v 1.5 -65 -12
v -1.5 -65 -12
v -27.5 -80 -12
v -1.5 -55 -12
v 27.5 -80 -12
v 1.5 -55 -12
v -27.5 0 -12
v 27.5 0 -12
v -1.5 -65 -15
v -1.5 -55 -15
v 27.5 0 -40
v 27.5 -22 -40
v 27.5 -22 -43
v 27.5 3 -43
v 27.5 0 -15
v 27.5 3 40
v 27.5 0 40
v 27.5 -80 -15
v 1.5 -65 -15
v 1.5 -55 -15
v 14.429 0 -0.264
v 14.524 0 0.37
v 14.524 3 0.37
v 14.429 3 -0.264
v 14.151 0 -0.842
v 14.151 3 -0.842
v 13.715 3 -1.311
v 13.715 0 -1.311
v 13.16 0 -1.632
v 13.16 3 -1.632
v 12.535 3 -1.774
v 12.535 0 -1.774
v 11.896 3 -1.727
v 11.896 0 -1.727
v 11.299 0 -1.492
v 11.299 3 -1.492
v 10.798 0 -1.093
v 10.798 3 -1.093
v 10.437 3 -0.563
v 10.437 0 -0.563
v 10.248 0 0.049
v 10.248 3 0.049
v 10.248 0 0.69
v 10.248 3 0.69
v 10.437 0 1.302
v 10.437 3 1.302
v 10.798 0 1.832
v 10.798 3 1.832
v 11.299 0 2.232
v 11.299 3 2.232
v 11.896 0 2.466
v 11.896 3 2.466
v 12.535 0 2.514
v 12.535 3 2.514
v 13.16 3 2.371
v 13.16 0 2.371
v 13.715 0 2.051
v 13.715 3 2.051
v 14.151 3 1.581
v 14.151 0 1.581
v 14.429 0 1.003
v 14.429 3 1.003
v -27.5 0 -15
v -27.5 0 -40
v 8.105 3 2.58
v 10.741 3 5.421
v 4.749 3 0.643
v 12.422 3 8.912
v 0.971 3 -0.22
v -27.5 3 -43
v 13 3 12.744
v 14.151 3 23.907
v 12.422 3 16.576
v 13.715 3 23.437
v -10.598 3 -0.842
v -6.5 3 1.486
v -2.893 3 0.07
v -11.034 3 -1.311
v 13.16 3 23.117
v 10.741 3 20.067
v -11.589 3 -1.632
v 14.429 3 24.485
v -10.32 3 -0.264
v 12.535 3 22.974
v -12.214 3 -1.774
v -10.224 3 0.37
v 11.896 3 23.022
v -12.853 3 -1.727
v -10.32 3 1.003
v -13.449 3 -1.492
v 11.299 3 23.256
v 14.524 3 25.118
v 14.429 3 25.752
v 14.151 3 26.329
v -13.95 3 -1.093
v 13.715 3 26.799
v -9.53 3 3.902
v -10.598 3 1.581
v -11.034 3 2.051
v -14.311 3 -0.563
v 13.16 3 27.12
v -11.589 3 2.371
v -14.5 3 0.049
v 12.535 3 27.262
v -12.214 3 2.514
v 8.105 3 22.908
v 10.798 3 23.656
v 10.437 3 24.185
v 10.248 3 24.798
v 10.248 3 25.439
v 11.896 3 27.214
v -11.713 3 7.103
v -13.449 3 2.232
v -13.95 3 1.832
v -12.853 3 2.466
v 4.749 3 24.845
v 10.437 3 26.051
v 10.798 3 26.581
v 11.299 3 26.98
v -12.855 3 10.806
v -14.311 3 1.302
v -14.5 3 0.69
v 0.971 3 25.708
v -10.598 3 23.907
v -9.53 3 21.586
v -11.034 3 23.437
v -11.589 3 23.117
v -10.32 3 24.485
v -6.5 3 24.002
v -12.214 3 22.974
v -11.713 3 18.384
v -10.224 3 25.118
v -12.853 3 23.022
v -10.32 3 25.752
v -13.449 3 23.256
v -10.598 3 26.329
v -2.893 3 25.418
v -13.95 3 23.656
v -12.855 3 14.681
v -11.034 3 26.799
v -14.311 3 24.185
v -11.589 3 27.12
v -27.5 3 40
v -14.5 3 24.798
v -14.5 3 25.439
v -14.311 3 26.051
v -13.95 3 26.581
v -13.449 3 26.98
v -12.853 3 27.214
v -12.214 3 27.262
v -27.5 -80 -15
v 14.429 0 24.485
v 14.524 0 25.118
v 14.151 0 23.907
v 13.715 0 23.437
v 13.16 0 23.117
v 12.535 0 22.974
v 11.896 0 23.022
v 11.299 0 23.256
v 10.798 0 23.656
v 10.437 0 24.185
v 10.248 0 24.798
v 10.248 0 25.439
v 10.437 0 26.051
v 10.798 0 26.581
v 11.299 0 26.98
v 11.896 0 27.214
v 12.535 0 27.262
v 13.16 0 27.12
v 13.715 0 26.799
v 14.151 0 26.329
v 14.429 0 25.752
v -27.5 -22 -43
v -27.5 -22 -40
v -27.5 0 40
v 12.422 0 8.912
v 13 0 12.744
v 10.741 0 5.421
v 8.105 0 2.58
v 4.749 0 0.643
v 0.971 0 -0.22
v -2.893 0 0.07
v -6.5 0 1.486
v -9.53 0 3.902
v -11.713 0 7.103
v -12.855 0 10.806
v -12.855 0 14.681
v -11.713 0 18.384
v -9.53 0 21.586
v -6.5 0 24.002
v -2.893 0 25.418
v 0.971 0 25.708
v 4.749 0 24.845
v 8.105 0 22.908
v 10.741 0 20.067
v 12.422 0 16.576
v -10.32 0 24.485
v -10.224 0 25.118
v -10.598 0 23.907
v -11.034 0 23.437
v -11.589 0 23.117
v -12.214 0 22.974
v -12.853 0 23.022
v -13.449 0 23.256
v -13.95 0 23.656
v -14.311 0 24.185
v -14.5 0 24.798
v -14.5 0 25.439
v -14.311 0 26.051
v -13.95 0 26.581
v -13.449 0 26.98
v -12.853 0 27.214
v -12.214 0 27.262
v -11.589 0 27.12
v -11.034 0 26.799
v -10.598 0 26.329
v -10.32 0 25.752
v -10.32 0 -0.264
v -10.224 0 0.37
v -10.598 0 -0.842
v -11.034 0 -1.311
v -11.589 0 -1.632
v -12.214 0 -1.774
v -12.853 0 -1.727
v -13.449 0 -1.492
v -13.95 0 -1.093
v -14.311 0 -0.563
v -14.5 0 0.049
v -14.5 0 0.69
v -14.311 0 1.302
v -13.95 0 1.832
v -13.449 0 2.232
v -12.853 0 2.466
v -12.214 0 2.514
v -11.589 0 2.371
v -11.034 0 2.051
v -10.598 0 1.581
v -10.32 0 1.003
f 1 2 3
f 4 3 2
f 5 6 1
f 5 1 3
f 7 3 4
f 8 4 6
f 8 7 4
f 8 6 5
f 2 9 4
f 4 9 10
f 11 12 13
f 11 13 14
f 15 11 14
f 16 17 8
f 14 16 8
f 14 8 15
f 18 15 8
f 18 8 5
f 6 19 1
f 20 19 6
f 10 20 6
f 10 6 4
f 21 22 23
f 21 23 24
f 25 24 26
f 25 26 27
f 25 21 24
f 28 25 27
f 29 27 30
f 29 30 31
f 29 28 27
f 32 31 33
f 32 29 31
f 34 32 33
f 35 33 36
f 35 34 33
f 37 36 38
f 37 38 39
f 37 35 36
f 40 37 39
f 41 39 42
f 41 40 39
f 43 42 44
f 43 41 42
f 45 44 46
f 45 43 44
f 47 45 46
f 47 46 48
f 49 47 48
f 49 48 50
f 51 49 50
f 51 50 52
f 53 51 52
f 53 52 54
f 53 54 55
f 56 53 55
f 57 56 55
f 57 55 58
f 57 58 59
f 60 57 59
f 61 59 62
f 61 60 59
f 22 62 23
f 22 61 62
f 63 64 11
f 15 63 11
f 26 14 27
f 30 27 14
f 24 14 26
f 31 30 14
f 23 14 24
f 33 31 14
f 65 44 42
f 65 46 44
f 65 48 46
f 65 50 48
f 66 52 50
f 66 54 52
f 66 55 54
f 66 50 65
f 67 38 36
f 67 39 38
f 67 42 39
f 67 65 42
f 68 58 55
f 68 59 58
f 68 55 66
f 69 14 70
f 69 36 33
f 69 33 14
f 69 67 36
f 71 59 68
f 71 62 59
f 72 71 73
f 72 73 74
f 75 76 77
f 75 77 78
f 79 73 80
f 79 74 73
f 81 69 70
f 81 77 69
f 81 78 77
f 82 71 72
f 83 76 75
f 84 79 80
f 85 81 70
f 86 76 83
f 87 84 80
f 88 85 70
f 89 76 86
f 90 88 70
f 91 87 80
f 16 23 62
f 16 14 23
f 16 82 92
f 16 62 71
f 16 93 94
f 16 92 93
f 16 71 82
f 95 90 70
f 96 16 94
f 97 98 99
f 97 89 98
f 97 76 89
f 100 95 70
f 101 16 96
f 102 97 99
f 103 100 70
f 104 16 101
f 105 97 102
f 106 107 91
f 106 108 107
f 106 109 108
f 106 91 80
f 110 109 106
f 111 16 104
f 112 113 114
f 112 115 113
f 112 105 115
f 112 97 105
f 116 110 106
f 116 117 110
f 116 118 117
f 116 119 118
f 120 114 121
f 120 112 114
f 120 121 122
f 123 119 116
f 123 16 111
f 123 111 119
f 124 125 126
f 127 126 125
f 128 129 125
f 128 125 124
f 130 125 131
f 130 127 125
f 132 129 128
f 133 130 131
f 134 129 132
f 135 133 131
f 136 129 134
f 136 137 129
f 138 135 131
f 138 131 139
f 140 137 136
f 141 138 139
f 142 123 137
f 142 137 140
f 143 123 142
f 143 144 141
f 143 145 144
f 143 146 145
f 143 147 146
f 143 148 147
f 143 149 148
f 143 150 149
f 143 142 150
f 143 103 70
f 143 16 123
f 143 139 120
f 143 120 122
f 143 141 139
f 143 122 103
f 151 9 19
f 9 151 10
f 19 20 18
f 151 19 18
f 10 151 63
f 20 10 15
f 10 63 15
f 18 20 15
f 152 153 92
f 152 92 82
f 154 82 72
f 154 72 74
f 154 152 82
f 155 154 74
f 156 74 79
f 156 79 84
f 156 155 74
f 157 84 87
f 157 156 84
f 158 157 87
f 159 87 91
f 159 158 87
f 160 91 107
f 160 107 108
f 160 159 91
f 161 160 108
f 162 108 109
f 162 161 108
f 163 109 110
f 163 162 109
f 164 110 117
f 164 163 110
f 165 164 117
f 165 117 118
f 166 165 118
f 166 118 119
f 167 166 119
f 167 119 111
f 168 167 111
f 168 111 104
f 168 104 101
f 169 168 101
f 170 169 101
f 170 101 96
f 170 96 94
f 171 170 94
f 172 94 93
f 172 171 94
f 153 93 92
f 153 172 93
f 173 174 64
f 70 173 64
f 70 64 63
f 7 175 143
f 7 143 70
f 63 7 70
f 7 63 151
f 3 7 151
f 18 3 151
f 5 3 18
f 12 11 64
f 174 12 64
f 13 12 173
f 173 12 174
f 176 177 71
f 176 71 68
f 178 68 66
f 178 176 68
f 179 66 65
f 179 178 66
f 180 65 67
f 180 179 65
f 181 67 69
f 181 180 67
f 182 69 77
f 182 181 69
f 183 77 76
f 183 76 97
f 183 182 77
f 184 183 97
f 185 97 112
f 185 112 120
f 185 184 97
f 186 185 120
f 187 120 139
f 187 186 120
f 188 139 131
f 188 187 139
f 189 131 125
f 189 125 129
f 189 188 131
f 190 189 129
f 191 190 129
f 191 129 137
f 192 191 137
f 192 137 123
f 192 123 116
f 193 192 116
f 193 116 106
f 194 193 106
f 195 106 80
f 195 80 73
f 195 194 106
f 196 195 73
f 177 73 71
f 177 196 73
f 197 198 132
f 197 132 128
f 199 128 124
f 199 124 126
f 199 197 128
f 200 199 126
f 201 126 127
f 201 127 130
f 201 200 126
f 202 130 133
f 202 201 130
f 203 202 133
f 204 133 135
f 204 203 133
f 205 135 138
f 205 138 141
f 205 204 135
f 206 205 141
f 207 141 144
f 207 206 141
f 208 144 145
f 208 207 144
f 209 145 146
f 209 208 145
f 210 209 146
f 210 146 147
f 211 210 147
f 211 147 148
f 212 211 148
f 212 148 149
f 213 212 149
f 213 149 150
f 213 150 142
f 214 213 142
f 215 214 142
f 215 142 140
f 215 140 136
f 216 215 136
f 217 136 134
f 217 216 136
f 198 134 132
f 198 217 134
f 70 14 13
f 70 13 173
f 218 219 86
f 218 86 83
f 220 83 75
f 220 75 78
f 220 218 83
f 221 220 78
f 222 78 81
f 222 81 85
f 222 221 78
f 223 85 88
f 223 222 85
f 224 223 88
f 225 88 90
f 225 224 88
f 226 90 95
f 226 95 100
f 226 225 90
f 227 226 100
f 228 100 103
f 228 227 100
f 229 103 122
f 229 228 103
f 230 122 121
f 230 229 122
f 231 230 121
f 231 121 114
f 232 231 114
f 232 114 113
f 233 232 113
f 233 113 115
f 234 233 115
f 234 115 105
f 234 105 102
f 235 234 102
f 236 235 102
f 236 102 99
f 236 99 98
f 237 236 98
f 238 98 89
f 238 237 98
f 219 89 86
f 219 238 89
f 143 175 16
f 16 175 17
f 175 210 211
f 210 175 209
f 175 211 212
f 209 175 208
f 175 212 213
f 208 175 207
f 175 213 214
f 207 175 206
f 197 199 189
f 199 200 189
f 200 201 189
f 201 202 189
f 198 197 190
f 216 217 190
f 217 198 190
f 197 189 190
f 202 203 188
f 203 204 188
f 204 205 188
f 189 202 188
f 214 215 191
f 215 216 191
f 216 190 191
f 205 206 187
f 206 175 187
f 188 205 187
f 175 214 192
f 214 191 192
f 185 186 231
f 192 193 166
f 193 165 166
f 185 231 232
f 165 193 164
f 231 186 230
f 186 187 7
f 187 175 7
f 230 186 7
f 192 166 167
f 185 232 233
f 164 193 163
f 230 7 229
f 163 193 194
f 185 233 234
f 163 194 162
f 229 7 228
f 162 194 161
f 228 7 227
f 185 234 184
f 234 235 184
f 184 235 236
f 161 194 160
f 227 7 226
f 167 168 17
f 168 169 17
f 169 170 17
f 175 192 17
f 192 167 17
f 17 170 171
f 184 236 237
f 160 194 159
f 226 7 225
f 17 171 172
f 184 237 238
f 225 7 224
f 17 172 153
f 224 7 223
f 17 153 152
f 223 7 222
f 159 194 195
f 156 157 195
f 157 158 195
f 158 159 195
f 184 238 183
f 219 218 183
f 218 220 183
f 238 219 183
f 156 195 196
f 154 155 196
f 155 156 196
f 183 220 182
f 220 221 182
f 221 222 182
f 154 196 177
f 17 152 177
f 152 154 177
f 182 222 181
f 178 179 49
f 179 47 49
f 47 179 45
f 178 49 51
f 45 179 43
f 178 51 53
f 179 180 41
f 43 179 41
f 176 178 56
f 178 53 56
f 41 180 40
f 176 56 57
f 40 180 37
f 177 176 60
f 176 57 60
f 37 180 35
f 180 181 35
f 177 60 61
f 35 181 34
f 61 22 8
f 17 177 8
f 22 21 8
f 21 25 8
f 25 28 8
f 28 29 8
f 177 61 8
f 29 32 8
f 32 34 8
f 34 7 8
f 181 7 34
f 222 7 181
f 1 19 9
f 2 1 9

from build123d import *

# Parameters (mm, degrees)
SKETCH1_W           = 55
SKETCH1_H           = 80
SKETCH1_R           = 13
SKETCH1_R_2         = 2.15
BOSS_EXTRUDE2_DEPTH = 3
SKETCH2_W           = 55
SKETCH2_H           = 3
BOSS_EXTRUDE3_DEPTH = 80
SKETCH3_W           = 3
SKETCH3_H           = 10
CUT_EXTRUDE1_DEPTH  = 80
SKETCH4_W           = 55
SKETCH4_H           = 25
BOSS_EXTRUDE4_DEPTH = 3


with BuildPart() as part:
    # Sketch1 → Boss-Extrude2 (new body)
    with BuildSketch(Plane(origin=(0, 0, 0), x_dir=(1, 0, 0), z_dir=(0, 1, 0))):
        Rectangle(SKETCH1_W, SKETCH1_H)
        with Locations((0, -12.743931666)):
            Circle(SKETCH1_R, mode=Mode.SUBTRACT)
        with Locations((12.374368671, -0.369562995)):
            Circle(SKETCH1_R_2, mode=Mode.SUBTRACT)
        with Locations((12.374368671, -25.118300337)):
            Circle(SKETCH1_R_2, mode=Mode.SUBTRACT)
        with Locations((-12.374368671, -25.118300337)):
            Circle(SKETCH1_R_2, mode=Mode.SUBTRACT)
        with Locations((-12.374368671, -0.369562995)):
            Circle(SKETCH1_R_2, mode=Mode.SUBTRACT)
    extrude(amount=BOSS_EXTRUDE2_DEPTH)

    # Sketch2 → Boss-Extrude3 (add)
    with BuildSketch(Plane.XZ):
        with Locations((0, -13.5)):
            Rectangle(SKETCH2_W, SKETCH2_H)
    extrude(amount=BOSS_EXTRUDE3_DEPTH)

    # Sketch3 → Cut-Extrude1 (cut)
    with BuildSketch(Plane(origin=(0, 0, -15), x_dir=(-1, 0, 0), z_dir=(0, 0, -1))):
        with Locations((0, -60)):
            Rectangle(SKETCH3_W, SKETCH3_H)
    extrude(amount=-CUT_EXTRUDE1_DEPTH, mode=Mode.SUBTRACT)

    # Sketch4 → Boss-Extrude4 (add)
    with BuildSketch(Plane(origin=(0, 0, -40), x_dir=(-1, 0, 0), z_dir=(0, 0, -1))):
        with Locations((0, -9.5)):
            Rectangle(SKETCH4_W, SKETCH4_H)
    extrude(amount=BOSS_EXTRUDE4_DEPTH)


solid = part.part
